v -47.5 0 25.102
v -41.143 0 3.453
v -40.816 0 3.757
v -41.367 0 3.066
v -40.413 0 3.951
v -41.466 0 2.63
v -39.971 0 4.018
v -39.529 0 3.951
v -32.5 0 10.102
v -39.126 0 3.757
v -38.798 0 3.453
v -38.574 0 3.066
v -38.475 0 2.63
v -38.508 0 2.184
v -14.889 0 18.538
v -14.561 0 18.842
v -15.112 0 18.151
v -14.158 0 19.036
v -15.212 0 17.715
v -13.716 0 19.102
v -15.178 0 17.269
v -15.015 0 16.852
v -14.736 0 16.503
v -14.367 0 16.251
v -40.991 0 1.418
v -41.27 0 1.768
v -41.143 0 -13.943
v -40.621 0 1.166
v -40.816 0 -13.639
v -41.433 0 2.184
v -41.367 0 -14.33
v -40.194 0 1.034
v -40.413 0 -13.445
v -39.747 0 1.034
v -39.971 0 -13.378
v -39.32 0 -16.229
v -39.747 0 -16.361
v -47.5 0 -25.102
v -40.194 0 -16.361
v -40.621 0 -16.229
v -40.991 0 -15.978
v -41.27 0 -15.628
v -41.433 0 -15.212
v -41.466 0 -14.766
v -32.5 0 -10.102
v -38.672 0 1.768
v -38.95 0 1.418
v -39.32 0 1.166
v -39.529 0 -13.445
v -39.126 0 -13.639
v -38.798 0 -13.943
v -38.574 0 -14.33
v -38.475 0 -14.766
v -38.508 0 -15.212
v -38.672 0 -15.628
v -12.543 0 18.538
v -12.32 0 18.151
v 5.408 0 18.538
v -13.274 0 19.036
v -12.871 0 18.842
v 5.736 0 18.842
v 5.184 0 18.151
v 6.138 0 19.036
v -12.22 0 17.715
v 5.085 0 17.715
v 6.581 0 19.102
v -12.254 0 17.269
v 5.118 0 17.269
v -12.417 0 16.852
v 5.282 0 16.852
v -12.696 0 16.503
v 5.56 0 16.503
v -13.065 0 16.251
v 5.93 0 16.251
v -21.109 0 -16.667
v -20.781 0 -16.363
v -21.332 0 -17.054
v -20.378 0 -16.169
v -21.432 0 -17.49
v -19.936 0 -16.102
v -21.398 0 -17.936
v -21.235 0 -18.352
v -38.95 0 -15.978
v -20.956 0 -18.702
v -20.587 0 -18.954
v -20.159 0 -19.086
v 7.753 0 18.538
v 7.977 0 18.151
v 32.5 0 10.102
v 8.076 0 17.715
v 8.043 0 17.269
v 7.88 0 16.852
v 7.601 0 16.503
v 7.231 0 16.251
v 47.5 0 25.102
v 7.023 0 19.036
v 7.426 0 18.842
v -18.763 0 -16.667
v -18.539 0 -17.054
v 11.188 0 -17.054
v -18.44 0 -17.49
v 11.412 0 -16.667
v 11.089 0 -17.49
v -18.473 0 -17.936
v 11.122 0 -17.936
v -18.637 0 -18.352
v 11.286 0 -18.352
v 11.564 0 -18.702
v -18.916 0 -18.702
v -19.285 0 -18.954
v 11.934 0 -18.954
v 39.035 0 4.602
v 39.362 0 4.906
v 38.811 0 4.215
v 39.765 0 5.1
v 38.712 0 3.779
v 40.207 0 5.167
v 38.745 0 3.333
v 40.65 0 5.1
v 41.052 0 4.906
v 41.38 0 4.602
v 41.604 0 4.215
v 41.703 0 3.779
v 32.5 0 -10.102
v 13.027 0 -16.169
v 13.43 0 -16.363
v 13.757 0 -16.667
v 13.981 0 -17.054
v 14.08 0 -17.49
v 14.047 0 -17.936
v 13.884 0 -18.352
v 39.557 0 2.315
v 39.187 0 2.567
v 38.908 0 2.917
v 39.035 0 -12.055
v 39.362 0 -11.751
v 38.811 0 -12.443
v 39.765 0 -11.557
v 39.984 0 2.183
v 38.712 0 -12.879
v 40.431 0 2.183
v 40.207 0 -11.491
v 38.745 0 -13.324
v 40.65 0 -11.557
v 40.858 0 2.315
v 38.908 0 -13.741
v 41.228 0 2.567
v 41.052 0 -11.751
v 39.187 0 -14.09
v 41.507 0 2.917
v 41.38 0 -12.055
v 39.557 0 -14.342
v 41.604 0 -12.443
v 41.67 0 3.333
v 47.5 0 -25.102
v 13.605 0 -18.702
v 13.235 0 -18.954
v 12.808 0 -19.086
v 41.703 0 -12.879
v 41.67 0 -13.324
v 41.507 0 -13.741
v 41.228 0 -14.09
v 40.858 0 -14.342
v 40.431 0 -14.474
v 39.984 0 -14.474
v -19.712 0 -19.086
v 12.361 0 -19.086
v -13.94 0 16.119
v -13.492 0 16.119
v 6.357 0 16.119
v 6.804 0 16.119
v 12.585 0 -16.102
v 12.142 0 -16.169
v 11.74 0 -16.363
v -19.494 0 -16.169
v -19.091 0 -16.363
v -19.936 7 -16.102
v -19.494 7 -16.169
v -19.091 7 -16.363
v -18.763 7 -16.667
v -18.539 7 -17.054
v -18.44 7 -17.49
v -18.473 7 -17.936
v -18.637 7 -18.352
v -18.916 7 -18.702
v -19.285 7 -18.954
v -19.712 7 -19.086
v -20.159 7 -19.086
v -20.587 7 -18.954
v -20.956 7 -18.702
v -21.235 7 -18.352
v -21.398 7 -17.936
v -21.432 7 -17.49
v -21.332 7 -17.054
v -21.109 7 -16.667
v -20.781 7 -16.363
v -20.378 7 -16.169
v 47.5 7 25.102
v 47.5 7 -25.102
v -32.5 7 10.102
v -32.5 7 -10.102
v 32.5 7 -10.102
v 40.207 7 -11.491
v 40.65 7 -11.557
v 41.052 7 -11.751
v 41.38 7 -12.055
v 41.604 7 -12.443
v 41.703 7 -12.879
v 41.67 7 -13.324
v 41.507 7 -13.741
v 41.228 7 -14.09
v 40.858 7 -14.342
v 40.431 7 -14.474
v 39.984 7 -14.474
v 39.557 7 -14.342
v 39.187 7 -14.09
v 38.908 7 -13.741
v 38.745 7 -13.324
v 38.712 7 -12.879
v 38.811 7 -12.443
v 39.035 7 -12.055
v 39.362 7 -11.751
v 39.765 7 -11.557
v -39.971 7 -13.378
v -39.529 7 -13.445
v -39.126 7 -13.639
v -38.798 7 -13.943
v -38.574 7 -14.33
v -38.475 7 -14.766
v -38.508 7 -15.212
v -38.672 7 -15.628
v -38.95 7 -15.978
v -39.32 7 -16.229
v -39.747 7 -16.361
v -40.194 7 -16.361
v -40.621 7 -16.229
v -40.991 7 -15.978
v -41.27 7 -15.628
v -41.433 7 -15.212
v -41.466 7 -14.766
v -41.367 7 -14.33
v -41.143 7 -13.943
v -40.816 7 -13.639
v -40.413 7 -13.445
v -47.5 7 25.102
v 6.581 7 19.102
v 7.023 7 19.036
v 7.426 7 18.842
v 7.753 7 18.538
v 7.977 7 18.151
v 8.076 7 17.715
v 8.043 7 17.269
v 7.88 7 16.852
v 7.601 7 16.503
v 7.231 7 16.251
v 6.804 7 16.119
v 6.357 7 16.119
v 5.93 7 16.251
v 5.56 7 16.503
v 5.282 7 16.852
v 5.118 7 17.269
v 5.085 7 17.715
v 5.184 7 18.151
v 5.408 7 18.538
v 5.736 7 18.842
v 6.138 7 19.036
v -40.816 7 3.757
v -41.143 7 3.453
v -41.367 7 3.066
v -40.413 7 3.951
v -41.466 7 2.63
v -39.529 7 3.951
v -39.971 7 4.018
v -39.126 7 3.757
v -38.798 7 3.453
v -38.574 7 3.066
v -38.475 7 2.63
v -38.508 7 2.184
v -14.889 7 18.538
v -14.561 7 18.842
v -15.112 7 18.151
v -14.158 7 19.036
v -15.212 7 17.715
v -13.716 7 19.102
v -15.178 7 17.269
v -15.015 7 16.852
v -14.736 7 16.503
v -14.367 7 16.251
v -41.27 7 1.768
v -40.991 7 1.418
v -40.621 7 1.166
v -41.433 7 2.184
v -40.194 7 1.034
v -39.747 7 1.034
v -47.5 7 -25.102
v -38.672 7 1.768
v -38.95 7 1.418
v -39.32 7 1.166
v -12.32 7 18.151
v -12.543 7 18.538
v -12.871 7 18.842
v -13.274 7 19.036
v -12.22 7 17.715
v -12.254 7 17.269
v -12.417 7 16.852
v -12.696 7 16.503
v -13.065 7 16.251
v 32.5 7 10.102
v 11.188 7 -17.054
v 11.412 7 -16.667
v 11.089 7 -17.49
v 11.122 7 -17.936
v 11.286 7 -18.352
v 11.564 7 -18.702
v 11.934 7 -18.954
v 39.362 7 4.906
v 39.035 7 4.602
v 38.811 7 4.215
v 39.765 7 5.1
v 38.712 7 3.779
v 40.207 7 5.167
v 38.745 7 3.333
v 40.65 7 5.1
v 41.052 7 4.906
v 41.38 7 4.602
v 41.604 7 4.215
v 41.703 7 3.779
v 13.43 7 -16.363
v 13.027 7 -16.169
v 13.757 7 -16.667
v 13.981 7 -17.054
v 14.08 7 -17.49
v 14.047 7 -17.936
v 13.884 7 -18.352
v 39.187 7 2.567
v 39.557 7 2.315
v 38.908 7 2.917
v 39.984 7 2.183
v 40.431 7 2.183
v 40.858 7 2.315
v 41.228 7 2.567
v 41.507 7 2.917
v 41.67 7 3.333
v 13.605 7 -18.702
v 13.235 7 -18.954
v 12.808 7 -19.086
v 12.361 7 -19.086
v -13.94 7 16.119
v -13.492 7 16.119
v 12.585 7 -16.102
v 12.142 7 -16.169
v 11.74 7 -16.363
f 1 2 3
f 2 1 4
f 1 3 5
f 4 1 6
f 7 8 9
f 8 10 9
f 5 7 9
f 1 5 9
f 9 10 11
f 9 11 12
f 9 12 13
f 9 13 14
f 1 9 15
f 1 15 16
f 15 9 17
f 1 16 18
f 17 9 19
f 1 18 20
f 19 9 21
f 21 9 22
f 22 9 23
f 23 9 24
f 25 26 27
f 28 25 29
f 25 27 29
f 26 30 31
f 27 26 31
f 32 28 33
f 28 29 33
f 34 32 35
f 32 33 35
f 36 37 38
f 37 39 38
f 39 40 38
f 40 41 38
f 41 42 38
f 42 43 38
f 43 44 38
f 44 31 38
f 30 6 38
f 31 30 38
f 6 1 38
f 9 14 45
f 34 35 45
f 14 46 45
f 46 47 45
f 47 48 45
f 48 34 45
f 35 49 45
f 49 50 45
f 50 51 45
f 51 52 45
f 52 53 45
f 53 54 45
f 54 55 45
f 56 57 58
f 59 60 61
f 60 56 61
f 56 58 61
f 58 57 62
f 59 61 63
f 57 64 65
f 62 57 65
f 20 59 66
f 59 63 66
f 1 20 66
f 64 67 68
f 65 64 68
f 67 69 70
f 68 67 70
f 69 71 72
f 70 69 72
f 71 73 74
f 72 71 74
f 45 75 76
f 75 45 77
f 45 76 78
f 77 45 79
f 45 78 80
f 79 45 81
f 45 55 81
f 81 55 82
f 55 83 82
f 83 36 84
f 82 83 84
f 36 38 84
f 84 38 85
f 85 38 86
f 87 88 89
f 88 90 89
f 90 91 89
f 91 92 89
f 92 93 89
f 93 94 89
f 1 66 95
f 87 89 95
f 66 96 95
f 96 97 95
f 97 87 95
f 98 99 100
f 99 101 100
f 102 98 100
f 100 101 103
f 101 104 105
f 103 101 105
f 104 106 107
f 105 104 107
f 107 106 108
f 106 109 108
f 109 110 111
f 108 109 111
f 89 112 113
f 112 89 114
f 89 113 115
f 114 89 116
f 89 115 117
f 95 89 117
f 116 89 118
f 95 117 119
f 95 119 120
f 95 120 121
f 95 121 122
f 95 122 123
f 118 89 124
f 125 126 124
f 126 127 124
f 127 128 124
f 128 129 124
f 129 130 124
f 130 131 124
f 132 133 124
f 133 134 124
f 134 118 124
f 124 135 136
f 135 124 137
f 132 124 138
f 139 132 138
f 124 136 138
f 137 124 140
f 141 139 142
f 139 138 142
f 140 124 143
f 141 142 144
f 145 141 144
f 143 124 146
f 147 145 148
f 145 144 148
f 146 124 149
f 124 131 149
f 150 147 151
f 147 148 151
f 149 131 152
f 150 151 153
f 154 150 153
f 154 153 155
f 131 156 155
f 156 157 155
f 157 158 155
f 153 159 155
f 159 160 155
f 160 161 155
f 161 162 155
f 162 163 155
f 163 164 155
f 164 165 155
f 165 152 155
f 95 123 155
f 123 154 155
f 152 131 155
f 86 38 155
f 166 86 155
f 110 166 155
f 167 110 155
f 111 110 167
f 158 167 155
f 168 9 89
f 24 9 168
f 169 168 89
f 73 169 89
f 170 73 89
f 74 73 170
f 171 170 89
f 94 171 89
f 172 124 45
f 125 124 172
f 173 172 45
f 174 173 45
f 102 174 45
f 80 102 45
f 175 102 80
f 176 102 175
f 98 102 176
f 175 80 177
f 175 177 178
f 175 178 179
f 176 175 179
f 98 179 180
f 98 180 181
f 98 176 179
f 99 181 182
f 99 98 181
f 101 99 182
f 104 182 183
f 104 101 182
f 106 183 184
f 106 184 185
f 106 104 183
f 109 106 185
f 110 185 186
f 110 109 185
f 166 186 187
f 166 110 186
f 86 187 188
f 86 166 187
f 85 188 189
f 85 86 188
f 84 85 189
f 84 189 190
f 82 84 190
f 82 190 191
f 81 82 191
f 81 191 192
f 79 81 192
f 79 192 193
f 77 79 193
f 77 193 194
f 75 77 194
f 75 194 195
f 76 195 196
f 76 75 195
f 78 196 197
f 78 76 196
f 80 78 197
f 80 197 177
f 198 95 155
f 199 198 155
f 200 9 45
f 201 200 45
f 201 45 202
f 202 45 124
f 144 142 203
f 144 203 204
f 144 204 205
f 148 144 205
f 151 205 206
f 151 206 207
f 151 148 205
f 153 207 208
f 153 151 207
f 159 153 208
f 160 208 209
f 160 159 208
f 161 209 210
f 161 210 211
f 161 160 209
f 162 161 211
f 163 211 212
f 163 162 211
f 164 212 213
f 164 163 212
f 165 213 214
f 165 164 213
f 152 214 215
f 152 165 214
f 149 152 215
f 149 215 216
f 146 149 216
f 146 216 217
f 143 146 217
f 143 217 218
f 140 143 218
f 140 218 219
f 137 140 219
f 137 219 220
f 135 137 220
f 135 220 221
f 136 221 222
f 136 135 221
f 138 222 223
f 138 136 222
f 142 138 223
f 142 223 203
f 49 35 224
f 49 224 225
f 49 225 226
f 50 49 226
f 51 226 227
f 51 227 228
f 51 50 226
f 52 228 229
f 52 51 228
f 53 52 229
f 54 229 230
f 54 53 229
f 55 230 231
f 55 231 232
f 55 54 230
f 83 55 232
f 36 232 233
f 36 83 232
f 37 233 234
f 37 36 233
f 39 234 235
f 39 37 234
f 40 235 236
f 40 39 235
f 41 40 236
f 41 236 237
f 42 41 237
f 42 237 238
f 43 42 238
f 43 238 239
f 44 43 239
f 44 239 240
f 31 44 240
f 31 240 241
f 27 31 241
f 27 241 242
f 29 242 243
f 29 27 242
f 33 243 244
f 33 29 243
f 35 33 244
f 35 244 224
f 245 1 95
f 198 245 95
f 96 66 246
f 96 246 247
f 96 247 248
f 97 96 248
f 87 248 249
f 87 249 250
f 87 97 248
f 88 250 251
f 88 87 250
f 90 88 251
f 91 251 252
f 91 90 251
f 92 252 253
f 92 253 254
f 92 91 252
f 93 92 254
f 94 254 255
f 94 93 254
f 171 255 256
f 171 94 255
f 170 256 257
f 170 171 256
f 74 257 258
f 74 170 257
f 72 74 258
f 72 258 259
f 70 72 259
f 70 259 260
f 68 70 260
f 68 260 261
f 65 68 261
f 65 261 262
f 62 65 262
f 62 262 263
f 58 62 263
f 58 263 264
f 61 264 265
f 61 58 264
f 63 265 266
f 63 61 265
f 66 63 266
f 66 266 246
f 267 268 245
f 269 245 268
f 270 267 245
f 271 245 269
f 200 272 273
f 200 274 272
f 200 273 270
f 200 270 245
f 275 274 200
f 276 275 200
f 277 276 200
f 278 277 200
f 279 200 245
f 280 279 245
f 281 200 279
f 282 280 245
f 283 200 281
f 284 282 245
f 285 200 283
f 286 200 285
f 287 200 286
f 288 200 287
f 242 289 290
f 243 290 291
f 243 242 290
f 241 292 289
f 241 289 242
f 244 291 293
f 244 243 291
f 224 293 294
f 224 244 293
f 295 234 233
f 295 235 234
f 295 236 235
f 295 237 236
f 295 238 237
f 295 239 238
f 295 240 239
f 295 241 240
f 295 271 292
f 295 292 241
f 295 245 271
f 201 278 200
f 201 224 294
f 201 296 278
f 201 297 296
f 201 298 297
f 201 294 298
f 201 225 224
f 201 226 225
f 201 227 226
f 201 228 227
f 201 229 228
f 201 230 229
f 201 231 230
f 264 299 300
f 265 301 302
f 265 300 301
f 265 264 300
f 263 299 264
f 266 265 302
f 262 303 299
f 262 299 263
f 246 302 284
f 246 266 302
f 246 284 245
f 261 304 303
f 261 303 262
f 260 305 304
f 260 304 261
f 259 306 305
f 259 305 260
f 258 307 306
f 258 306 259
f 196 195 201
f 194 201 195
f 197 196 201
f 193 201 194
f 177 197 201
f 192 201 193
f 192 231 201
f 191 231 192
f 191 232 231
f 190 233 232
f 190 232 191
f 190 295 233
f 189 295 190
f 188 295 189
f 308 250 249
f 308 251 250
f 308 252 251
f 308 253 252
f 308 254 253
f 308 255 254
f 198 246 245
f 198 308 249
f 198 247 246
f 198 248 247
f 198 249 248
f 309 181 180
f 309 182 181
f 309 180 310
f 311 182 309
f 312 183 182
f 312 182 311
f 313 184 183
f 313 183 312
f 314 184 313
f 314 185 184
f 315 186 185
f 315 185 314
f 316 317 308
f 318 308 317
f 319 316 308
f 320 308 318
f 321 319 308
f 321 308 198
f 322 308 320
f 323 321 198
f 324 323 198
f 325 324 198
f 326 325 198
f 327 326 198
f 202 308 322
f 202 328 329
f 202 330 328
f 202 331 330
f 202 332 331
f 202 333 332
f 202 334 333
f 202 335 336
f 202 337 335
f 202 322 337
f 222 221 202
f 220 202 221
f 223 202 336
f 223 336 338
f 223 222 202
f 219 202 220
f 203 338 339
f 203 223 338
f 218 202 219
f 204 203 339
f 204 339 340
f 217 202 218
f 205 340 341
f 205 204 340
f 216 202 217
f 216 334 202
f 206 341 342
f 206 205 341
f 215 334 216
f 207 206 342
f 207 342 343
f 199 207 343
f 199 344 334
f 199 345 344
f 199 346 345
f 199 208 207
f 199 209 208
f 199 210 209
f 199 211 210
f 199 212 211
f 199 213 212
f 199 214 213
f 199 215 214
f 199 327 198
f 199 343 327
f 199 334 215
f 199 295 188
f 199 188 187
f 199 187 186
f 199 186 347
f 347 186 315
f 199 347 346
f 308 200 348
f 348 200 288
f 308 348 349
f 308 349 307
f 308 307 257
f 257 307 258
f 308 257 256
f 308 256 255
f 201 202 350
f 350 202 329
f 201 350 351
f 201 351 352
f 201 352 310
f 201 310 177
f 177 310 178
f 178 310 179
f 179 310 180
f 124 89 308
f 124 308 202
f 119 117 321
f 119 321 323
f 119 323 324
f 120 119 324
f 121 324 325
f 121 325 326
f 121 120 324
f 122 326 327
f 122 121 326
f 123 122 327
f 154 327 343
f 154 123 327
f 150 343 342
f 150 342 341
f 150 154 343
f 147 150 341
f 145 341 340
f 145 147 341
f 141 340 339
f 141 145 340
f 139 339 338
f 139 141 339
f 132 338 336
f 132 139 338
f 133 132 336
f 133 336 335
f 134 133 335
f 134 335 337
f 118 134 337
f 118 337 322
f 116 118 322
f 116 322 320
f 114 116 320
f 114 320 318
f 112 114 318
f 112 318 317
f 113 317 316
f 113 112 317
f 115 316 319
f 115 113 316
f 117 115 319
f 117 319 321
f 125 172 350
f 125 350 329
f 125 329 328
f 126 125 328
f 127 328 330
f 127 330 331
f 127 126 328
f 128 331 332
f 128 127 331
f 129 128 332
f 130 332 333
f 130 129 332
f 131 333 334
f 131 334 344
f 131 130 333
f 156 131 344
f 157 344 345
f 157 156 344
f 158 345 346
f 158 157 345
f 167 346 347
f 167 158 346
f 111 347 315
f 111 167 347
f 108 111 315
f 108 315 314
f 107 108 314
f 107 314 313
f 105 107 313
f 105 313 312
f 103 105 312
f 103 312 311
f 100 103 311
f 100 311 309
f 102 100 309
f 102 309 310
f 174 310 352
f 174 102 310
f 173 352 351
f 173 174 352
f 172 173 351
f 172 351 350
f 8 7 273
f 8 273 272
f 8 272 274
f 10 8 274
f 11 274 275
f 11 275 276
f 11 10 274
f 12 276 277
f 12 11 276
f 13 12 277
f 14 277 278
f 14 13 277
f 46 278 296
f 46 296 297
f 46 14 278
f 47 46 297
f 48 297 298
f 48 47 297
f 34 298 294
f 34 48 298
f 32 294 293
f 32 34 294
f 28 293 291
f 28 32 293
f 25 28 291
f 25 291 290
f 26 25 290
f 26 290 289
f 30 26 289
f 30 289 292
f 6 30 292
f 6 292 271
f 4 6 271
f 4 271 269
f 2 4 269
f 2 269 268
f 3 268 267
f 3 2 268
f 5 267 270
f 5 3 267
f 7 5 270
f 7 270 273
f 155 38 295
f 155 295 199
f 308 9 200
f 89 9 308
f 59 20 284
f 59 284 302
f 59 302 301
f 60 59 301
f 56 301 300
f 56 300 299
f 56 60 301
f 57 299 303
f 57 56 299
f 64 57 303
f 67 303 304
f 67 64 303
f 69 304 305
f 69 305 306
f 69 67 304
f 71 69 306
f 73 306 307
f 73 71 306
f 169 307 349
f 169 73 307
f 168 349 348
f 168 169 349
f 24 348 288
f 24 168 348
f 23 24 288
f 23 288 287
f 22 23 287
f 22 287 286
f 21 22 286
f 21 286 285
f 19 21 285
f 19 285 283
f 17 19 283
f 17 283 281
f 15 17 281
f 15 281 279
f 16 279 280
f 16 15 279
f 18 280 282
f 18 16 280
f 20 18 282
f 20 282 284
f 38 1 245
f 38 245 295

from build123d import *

# Parameters (mm, degrees)
SKETCH2_W           = 94.999999992
SKETCH2_H           = 50.20499992
SKETCH2_R           = 1.5
SKETCH2_W_2         = 64.999999992
SKETCH2_H_2         = 20.20499992
BOSS_EXTRUDE2_DEPTH = 7


with BuildPart() as part:
    # Sketch2 → Boss-Extrude2 (new body)
    with BuildSketch(Plane(origin=(0, 0, 0), x_dir=(1, 0, 0), z_dir=(0, 1, 0))):
        Rectangle(SKETCH2_W, SKETCH2_H)
        with Locations(Location((-19.935762724, 17.60249996, 0), (0, 0, 270))):
            Circle(SKETCH2_R, mode=Mode.SUBTRACT)
        with Locations(Location((12.584576228, 17.60249996, 0), (0, 0, 270))):
            Circle(SKETCH2_R, mode=Mode.SUBTRACT)
        with Locations(Location((-39.970648897, 14.877942076, 0), (0, 0, 270))):
            Circle(SKETCH2_R, mode=Mode.SUBTRACT)
        with Locations(Location((-39.970648897, -2.517744737, 0), (0, 0, 270))):
            Circle(SKETCH2_R, mode=Mode.SUBTRACT)
        with Locations(Location((40.207477372, 12.990674167, 0), (0, 0, 270))):
            Circle(SKETCH2_R, mode=Mode.SUBTRACT)
        with Locations(Location((40.207477372, -3.666516508, 0), (0, 0, 270))):
            Circle(SKETCH2_R, mode=Mode.SUBTRACT)
        with Locations(Location((-13.716054438, -17.60249996, 0), (0, 0, 270))):
            Circle(SKETCH2_R, mode=Mode.SUBTRACT)
        with Locations(Location((6.580630125, -17.60249996, 0), (0, 0, 270))):
            Circle(SKETCH2_R, mode=Mode.SUBTRACT)
        Rectangle(SKETCH2_W_2, SKETCH2_H_2, mode=Mode.SUBTRACT)
    extrude(amount=BOSS_EXTRUDE2_DEPTH)


solid = part.part
